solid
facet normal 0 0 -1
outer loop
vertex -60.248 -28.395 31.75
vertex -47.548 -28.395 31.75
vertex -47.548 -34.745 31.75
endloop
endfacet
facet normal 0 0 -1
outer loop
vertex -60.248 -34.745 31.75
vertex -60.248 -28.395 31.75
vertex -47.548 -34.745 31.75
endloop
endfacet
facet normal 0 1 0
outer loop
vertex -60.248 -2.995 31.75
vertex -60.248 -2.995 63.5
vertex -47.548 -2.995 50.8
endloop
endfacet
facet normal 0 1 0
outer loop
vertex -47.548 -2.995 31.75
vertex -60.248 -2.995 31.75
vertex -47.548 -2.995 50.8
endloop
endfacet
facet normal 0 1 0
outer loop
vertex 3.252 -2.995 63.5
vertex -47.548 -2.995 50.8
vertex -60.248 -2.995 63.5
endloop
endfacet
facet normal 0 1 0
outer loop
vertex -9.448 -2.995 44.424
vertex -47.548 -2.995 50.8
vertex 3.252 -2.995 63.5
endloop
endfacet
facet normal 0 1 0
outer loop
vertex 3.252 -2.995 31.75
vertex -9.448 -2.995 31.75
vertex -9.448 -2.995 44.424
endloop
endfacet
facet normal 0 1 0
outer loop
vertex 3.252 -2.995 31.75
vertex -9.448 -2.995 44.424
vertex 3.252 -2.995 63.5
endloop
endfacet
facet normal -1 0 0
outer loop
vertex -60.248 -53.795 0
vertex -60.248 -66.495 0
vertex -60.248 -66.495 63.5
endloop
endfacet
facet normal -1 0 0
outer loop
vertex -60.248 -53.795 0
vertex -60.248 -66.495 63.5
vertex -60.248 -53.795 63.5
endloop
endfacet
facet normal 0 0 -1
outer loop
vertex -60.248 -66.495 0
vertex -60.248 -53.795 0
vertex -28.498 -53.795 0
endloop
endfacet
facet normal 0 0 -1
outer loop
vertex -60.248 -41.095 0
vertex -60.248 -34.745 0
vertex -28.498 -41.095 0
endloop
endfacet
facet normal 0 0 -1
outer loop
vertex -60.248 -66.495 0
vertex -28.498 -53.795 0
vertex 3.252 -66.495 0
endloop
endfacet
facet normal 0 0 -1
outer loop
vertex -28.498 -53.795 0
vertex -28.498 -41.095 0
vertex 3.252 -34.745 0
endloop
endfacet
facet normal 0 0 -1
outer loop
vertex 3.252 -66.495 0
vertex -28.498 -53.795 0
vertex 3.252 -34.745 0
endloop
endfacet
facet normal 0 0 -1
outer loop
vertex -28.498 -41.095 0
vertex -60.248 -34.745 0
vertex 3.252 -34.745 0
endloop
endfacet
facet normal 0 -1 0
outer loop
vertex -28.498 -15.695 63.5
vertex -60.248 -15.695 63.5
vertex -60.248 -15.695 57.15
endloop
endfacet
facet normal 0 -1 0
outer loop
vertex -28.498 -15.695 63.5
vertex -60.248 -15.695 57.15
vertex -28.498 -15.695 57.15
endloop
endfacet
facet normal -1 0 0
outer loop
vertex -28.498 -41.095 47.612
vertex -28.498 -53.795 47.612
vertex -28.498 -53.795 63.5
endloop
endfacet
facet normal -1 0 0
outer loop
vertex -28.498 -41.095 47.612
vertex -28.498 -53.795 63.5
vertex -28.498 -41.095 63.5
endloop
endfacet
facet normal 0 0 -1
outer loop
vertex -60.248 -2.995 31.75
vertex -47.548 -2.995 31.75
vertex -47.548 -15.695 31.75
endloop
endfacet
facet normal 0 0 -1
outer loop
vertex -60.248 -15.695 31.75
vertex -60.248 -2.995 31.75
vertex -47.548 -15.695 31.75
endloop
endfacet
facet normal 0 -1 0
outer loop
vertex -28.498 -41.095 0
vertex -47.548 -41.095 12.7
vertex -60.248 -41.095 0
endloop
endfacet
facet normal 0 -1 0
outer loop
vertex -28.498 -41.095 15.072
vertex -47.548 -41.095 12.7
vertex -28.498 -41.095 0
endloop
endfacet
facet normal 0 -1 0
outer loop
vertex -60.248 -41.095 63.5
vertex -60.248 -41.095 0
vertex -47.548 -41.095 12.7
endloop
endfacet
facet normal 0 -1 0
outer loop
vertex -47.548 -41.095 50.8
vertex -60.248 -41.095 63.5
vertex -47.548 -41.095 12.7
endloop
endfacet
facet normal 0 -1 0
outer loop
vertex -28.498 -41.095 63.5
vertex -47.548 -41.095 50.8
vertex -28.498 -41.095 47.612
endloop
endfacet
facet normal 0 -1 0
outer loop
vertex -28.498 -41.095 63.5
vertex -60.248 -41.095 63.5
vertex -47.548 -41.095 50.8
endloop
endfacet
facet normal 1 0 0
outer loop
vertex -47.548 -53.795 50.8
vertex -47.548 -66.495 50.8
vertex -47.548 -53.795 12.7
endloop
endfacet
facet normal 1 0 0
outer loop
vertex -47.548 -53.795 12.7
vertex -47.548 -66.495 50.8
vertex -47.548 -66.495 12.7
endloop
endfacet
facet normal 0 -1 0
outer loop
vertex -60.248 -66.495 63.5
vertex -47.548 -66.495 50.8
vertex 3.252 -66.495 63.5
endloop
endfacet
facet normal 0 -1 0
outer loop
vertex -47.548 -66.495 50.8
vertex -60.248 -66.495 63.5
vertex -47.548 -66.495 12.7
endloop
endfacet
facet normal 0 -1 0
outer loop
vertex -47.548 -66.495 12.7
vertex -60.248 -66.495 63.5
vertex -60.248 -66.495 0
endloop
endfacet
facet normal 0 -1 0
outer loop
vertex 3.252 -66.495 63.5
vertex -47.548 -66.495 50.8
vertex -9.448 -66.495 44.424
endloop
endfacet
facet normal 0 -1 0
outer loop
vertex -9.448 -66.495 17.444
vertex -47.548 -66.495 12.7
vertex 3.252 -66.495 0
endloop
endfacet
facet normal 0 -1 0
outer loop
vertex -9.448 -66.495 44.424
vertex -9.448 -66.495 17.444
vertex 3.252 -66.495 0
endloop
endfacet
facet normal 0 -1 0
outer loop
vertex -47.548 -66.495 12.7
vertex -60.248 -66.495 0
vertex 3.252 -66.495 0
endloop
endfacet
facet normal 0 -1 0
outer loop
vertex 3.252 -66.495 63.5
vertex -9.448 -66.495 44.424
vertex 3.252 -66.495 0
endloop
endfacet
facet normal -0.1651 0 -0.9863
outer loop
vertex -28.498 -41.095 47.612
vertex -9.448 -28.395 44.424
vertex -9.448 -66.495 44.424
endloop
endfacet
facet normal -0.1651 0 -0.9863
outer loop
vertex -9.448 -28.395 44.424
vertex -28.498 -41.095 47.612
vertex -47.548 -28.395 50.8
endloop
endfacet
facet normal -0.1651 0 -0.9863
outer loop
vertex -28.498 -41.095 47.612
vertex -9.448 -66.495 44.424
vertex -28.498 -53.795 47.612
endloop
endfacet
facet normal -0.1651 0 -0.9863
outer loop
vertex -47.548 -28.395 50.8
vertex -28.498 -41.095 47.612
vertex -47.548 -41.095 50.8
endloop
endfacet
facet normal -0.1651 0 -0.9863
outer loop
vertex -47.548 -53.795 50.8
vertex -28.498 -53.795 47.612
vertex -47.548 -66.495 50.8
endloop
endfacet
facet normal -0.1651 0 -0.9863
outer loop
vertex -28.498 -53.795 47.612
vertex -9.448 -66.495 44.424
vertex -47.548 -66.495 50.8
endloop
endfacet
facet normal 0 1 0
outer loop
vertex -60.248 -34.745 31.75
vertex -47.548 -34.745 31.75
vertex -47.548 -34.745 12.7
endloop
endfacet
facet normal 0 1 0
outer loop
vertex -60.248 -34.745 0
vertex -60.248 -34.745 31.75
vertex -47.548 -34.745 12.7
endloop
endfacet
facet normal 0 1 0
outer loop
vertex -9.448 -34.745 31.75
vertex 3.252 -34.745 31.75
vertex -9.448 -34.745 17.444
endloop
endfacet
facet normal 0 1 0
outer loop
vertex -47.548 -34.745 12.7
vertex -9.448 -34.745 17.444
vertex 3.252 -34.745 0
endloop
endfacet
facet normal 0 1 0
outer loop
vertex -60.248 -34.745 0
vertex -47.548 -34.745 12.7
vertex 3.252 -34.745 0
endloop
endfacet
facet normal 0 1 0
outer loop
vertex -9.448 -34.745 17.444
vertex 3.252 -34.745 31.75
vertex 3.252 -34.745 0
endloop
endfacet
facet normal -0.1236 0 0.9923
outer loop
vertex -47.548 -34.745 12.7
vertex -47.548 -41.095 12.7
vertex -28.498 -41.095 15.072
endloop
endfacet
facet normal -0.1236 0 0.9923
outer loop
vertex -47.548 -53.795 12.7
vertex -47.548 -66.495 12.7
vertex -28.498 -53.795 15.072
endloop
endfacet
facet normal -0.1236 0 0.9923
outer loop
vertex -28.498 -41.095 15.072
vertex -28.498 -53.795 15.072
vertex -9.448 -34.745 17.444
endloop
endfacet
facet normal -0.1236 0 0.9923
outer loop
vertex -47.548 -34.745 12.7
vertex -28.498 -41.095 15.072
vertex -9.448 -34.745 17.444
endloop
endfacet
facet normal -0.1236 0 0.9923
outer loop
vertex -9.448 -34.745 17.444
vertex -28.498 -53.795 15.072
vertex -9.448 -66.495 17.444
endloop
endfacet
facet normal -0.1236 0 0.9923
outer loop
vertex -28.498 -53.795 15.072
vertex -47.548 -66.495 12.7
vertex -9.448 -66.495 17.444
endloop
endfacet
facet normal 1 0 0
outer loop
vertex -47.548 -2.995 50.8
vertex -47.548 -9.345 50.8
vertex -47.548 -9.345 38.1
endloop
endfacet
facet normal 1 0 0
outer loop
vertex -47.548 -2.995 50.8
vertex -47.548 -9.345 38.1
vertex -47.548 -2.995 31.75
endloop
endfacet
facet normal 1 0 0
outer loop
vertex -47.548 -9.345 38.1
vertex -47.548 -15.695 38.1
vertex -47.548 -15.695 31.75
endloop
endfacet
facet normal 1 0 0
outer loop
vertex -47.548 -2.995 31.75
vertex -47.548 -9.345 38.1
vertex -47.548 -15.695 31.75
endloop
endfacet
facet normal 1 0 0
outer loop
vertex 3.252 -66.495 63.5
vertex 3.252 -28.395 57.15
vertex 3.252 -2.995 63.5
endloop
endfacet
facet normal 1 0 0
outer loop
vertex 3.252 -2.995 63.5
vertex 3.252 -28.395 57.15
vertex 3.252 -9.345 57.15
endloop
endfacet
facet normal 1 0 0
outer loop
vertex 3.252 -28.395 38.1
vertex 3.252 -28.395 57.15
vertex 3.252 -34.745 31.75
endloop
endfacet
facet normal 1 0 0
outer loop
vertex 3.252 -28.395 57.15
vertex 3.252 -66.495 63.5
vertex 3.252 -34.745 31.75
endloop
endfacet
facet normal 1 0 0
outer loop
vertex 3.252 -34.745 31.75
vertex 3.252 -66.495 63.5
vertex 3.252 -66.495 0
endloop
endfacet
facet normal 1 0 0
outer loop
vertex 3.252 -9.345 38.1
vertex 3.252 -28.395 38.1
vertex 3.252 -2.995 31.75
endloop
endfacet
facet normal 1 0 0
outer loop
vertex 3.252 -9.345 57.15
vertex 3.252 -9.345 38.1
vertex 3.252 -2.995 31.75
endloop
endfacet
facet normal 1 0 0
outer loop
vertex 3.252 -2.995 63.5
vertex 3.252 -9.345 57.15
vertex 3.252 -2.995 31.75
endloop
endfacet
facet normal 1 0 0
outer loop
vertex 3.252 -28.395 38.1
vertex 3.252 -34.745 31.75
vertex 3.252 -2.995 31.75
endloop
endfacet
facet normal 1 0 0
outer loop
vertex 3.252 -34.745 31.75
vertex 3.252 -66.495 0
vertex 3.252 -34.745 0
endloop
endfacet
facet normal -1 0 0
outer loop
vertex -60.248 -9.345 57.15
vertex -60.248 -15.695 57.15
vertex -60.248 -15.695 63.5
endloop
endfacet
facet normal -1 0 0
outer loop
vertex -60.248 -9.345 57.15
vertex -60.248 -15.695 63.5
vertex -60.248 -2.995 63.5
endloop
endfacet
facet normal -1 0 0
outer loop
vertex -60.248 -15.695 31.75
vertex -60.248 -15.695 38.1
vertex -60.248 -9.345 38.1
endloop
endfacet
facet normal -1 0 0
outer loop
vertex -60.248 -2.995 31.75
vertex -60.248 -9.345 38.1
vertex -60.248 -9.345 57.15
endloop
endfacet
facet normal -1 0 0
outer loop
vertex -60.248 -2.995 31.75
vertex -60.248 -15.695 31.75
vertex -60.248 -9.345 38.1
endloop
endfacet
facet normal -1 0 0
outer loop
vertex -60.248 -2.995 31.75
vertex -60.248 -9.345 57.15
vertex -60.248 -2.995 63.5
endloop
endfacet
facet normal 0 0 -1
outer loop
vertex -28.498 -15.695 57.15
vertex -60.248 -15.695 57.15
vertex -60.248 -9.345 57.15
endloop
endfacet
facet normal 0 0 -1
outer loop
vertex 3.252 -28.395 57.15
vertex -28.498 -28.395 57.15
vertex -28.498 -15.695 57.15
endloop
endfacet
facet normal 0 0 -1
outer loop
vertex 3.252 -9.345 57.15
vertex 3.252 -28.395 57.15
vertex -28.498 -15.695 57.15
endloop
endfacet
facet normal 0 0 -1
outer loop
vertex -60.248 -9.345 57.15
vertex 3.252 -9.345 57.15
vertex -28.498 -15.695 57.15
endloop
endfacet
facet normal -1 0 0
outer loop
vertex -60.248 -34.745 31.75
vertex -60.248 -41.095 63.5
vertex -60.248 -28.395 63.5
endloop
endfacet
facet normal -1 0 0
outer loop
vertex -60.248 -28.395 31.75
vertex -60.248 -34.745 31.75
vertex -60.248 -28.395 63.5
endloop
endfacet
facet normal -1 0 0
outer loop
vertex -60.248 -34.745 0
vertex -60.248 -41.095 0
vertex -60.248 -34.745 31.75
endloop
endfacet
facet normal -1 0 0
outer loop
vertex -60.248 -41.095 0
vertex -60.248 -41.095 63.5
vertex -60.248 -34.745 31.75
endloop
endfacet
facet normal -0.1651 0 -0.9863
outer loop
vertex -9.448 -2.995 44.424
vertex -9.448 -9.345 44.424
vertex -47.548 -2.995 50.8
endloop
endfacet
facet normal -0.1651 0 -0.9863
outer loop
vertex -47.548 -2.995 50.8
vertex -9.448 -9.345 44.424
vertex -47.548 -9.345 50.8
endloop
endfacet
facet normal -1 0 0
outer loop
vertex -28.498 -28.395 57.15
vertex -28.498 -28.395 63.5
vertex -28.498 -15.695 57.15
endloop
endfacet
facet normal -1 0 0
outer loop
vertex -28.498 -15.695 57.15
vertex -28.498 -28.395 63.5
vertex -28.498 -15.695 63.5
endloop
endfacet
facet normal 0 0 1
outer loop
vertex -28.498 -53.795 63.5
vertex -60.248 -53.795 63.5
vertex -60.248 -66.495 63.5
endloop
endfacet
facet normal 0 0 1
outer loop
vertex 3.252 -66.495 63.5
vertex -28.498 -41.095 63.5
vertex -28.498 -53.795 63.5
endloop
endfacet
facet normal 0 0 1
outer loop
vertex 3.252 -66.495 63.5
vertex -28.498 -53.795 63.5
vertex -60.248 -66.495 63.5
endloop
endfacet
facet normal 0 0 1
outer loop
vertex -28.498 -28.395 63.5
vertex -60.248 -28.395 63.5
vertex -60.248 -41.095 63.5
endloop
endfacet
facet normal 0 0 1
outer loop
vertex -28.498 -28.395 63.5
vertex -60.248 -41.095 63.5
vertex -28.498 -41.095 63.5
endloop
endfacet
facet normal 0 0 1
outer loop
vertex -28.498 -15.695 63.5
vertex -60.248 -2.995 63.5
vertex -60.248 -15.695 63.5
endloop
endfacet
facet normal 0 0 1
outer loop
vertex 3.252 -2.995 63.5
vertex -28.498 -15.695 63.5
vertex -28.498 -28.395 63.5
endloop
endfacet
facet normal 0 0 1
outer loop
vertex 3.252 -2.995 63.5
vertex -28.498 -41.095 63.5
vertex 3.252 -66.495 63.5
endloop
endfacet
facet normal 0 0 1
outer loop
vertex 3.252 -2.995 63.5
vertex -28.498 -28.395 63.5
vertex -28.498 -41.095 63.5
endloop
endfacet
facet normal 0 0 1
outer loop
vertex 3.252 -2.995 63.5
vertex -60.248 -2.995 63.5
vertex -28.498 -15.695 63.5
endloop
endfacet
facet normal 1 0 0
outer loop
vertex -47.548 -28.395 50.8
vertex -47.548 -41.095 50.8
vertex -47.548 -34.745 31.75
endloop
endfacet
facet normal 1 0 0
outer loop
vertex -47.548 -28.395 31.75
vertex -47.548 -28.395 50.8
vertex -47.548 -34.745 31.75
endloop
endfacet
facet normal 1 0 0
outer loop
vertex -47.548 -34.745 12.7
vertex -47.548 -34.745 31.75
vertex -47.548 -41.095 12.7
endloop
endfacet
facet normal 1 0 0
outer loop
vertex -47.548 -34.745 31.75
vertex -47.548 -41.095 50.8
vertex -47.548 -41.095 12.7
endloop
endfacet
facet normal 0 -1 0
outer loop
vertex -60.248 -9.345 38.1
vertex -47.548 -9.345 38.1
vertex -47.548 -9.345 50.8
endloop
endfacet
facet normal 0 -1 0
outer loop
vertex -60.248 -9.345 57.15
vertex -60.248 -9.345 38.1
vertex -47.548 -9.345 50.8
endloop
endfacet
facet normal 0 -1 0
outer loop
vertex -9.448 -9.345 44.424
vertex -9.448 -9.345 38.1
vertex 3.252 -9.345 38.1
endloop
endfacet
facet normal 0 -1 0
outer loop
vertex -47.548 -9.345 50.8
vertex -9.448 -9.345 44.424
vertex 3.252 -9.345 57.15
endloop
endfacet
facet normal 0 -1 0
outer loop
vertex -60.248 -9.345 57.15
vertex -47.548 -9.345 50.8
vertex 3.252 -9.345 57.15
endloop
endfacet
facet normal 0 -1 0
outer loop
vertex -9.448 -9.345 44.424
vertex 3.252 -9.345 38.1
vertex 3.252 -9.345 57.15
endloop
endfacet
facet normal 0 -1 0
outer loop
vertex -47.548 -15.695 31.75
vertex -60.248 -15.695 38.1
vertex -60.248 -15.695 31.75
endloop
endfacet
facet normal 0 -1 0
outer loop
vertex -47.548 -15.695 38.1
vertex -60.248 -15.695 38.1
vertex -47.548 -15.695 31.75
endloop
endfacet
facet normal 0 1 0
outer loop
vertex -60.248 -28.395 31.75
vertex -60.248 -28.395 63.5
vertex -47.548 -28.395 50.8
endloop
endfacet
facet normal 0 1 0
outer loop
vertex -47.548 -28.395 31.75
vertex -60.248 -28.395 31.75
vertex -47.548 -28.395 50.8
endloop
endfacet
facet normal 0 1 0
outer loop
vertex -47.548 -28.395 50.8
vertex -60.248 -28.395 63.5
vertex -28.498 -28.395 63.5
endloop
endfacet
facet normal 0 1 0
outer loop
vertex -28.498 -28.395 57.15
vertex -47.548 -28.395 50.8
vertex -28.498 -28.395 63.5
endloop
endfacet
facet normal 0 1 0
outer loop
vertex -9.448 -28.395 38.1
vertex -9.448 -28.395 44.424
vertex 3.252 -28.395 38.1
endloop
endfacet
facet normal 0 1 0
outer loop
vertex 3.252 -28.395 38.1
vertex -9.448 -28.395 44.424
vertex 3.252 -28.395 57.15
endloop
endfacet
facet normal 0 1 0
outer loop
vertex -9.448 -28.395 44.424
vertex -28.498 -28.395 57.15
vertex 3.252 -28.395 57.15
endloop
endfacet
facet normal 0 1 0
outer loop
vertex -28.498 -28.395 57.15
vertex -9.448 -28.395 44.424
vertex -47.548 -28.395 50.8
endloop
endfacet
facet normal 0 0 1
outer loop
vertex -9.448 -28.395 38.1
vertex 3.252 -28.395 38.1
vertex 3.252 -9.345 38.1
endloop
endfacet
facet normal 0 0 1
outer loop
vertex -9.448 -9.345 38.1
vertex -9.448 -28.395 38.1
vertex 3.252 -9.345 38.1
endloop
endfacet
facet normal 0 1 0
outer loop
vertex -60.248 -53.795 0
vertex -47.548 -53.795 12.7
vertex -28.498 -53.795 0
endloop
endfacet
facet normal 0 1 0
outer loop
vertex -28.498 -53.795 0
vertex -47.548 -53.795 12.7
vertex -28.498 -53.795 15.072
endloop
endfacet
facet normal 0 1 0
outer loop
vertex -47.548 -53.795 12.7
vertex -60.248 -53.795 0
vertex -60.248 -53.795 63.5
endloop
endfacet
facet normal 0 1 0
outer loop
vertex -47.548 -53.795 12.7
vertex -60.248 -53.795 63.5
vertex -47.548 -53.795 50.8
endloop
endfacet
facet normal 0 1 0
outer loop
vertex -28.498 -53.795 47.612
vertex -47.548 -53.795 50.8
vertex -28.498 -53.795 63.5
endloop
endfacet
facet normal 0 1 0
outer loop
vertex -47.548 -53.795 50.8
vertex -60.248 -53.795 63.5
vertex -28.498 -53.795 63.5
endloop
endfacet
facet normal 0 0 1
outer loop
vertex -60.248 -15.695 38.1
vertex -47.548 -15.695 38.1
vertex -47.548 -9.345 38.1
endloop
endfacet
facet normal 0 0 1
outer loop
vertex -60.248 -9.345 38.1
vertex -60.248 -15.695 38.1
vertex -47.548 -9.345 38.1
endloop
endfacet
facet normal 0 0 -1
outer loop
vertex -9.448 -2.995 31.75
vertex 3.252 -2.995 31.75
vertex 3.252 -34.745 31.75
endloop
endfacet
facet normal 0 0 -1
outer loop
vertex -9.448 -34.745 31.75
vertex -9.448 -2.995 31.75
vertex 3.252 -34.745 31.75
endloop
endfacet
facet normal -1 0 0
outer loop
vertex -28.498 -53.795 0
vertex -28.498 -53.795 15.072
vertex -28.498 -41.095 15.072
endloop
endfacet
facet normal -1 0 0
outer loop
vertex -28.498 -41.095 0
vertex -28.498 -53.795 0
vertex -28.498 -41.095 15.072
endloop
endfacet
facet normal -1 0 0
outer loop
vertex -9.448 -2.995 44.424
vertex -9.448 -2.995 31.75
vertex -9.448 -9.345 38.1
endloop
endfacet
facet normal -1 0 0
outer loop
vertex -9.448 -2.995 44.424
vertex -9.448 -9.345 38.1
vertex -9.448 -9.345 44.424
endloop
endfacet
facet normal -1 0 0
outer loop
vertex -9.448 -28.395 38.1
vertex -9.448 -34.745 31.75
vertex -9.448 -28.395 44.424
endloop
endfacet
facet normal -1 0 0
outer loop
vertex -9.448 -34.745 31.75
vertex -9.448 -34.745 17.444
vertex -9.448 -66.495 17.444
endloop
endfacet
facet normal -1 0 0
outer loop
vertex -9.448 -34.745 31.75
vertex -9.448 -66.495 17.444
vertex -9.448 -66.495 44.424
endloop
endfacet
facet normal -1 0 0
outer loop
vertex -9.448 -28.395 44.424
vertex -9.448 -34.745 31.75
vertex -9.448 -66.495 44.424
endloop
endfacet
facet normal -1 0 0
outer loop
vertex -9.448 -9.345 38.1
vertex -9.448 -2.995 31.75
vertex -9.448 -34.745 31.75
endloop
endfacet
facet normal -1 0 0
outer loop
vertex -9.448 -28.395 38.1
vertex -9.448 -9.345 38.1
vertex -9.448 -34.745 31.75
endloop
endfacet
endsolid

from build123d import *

# Parameters (mm, degrees)
F0_W     = 63.5
F0_H     = 63.5
F1_DEPTH = 63.5
F2_W     = 31.75
F2_H     = 12.7
F3_DEPTH = 63.5
F4_W     = 19.05
F4_H     = 19.05
F5_DEPTH = 63.5
F7_DEPTH = 63.5


with BuildPart() as f1:
    # F0 (on Top) → F1 (new body)
    with BuildSketch(Plane.XY):
        with Locations((-28.497959, -34.744633)):
            Rectangle(F0_W, F0_H)
    extrude(amount=F1_DEPTH)

    # F2 (on face) → F3 (cut)
    with BuildSketch(Plane.XY.offset(63.5)):
        with Locations((-44.372959, -47.444633)):
            Rectangle(F2_W, F2_H)
        with Locations((-44.372959, -22.044633)):
            Rectangle(F2_W, F2_H)
    extrude(amount=-F3_DEPTH, mode=Mode.SUBTRACT)

    # F4 (on face) → F5 (cut)
    with BuildSketch(Plane.YZ.offset(3.252041)):
        Polygon((-28.394633, 31.75), (-34.744633, 31.75), (-34.744633, 0), (-2.994633, 0), (-2.994633, 31.75), align=None)
        with Locations((-18.869633, 47.625)):
            Rectangle(F4_W, F4_H)
    extrude(amount=-F5_DEPTH, mode=Mode.SUBTRACT)

    # F6 (on face) → F7 (cut)
    with BuildSketch(Plane.XZ.offset(66.494633)):
        Polygon((-47.547959, 50.8), (-47.547959, 12.7), (-9.447959, 17.444041), (-9.447959, 44.424161), align=None)
    extrude(amount=-F7_DEPTH, mode=Mode.SUBTRACT)


solid = f1.part
